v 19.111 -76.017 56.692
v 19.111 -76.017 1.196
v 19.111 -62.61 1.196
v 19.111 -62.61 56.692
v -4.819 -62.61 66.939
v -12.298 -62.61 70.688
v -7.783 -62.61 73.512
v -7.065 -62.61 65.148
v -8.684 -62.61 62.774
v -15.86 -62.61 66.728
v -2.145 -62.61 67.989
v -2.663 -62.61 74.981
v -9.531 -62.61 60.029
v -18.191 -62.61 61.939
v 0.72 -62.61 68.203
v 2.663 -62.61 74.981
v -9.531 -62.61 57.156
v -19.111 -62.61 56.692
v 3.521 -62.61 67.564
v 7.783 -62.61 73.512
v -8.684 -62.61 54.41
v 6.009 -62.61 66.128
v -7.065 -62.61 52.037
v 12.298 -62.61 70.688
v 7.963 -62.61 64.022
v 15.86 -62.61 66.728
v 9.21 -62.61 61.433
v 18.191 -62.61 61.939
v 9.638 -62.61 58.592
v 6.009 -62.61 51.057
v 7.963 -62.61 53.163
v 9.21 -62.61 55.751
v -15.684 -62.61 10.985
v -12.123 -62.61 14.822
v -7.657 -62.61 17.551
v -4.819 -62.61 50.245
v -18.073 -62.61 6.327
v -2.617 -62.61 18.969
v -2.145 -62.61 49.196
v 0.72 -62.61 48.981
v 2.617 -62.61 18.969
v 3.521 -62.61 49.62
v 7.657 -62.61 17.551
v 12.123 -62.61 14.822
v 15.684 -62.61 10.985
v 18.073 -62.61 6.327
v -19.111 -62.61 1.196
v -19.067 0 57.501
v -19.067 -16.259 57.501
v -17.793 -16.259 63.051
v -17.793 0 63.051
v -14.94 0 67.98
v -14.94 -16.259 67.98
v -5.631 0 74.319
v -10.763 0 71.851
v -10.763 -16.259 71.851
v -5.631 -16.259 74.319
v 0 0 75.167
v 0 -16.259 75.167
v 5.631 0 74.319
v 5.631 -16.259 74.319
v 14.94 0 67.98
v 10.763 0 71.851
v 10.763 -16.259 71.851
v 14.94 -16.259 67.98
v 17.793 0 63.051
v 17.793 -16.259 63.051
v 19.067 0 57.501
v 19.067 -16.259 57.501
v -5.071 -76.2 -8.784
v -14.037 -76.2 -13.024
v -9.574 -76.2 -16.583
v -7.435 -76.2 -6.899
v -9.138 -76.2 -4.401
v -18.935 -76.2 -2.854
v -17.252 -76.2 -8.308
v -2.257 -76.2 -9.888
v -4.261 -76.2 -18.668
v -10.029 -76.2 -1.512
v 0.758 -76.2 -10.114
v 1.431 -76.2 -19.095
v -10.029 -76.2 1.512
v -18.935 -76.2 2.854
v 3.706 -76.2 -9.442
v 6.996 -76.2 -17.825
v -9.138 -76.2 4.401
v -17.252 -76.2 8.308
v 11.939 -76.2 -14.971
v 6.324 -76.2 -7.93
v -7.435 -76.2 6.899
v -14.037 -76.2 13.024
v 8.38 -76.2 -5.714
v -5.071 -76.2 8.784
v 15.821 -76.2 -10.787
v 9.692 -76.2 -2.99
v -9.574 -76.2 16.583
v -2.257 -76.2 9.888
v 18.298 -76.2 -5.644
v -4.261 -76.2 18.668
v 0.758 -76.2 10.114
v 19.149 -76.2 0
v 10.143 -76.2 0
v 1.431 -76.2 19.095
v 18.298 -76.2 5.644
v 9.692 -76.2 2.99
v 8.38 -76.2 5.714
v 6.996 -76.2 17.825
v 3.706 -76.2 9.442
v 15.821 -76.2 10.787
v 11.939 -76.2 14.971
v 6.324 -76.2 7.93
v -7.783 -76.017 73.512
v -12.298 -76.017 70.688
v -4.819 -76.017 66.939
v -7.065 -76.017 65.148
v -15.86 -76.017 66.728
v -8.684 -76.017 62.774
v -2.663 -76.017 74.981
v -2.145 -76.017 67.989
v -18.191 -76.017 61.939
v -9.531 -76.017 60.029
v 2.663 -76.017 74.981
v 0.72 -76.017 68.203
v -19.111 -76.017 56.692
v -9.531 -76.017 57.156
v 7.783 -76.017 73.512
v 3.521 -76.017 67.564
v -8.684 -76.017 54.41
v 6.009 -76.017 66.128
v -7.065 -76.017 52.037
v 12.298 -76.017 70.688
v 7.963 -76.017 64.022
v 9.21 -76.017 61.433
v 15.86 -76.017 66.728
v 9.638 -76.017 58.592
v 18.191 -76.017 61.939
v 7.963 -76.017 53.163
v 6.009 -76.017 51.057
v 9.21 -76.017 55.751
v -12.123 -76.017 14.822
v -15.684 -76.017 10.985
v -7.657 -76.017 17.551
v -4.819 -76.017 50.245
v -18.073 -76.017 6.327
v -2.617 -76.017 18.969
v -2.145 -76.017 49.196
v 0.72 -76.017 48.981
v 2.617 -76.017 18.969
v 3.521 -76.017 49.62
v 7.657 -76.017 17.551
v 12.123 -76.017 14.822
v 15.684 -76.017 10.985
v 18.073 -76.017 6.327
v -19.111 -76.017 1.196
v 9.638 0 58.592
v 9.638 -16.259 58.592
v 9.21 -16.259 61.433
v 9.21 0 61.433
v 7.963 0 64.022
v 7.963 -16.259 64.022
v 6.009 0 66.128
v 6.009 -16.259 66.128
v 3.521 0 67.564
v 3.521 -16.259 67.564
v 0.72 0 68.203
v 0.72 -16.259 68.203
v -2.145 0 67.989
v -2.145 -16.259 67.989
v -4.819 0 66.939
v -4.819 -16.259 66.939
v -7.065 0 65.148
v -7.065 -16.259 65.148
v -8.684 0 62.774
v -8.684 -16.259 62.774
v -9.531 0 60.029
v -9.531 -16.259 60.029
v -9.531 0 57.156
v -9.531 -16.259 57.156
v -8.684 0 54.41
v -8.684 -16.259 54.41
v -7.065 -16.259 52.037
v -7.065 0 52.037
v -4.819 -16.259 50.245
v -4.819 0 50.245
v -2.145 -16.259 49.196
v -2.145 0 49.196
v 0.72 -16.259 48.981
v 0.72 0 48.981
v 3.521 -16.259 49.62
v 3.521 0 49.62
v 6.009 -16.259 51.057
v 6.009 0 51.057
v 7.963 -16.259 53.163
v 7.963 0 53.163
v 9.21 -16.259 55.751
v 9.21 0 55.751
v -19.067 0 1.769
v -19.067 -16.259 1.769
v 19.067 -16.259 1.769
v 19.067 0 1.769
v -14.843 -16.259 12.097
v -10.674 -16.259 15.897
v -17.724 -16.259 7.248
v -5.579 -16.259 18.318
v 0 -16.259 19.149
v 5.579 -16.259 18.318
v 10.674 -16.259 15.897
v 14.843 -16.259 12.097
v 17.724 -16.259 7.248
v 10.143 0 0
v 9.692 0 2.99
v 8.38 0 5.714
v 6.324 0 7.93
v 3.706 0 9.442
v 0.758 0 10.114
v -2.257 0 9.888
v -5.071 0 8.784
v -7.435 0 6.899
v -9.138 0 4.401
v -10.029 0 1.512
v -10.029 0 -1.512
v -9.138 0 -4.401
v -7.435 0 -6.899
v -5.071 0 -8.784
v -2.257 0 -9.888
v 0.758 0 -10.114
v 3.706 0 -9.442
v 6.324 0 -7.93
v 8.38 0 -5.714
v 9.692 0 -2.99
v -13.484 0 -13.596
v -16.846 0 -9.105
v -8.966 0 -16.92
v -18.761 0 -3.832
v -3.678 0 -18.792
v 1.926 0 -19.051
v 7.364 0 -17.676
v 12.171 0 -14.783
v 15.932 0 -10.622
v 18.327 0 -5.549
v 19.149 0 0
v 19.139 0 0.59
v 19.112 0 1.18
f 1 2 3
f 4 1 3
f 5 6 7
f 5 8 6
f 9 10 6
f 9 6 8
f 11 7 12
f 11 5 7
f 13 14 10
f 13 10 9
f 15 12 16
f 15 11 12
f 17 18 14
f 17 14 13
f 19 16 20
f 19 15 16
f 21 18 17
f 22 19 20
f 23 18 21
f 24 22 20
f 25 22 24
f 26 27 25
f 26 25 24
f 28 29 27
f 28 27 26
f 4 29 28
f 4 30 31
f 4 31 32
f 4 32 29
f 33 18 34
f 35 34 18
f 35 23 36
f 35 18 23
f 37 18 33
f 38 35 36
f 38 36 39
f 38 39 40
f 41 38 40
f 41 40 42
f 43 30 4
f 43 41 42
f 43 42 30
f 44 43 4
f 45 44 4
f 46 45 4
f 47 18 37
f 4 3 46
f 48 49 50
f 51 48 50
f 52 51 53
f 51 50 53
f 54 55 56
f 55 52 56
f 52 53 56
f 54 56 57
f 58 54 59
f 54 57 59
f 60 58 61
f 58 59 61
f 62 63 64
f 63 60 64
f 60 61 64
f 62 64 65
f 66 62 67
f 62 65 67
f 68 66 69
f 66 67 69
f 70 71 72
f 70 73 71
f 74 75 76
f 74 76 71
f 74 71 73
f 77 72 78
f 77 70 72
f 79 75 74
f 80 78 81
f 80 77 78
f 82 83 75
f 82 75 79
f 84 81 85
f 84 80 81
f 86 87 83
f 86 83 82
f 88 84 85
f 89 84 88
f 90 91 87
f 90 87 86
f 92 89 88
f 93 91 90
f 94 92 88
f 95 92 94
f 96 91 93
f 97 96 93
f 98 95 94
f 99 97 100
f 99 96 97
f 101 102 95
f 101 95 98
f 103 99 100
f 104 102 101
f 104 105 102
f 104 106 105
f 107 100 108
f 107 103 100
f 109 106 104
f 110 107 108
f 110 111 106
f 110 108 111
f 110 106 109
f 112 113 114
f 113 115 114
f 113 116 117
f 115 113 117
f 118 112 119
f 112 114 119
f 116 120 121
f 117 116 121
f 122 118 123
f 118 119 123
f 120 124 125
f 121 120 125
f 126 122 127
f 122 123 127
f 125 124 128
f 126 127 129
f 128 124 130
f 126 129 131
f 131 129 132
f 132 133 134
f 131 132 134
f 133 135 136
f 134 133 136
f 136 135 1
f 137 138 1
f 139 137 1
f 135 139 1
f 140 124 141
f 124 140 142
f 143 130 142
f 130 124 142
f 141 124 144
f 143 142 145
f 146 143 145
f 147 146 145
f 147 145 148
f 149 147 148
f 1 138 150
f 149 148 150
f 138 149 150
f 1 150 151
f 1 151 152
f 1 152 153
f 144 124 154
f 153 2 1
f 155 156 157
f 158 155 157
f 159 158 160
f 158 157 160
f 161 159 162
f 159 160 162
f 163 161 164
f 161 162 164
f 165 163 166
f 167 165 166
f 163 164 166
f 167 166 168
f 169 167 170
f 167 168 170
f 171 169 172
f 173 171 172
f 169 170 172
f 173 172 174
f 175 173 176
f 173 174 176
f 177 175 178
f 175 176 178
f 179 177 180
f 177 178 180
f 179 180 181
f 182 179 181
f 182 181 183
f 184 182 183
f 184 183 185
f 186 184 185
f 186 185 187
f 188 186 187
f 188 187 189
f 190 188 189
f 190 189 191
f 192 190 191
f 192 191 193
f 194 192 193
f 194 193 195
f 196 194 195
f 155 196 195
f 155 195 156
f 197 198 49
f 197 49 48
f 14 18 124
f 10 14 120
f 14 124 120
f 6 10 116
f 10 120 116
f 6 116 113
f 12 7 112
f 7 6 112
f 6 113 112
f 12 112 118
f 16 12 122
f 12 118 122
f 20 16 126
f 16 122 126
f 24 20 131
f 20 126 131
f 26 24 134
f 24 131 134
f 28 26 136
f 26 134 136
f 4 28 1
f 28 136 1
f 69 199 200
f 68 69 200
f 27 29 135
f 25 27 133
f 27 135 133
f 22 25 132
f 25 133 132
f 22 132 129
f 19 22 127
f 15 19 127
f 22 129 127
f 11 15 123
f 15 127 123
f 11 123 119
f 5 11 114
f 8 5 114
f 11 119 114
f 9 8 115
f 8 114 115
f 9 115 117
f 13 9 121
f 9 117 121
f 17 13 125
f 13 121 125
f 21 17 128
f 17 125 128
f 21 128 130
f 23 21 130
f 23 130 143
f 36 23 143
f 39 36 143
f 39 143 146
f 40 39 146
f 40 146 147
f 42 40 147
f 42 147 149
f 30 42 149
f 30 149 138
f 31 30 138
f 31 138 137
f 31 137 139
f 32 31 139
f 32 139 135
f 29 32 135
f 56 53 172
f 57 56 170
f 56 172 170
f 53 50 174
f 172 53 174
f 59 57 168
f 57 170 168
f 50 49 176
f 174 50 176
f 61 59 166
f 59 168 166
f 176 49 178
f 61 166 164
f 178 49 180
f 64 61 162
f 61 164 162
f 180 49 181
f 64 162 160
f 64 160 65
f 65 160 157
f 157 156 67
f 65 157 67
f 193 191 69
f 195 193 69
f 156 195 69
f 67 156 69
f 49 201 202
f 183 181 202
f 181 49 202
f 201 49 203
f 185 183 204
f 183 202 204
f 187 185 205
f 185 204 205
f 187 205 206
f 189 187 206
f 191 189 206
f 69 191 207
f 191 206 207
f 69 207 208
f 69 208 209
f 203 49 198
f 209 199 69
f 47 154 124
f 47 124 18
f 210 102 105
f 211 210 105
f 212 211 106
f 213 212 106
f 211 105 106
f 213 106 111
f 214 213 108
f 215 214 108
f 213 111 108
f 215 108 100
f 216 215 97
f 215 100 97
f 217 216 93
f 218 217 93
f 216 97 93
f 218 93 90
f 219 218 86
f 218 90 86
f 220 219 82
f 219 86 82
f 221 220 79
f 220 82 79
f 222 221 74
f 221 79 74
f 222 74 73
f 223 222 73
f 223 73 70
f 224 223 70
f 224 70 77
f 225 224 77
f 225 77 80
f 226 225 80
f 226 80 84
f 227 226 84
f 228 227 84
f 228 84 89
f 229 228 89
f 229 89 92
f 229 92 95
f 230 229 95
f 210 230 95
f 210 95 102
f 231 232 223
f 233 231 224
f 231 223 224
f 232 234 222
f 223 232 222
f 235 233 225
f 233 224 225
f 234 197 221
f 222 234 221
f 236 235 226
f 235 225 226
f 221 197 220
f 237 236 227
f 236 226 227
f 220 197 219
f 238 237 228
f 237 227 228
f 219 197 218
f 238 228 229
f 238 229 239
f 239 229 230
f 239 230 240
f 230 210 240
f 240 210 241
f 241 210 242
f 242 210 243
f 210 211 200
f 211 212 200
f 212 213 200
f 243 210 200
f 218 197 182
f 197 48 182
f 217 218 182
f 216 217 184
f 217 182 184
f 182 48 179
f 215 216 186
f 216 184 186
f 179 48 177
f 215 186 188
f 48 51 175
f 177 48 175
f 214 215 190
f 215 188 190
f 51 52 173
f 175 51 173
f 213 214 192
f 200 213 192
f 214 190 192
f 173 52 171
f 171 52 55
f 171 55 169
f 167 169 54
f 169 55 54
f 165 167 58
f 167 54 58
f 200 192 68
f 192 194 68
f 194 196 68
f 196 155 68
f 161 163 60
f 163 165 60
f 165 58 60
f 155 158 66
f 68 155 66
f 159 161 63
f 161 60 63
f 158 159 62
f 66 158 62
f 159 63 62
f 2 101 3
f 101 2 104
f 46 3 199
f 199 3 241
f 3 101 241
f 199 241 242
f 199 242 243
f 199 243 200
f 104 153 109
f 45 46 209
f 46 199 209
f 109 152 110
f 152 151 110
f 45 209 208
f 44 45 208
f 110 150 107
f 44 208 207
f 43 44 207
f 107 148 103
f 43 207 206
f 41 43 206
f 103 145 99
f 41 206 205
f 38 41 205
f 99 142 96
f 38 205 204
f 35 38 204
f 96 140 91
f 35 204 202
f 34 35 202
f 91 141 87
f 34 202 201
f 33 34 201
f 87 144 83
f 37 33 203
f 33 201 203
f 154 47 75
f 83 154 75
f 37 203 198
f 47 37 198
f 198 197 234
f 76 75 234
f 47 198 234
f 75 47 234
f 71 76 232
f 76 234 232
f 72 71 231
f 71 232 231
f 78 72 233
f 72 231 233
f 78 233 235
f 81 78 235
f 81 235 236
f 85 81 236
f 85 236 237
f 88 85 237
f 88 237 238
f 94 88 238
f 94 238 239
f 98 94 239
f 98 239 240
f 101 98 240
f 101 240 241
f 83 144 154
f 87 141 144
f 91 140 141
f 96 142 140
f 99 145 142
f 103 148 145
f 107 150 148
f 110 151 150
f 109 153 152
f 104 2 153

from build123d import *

# Parameters (mm, degrees)
F0_R      = 19.1485137608
F1_DEPTH  = 76.2
F2_R      = 10.1427054409
F3_DEPTH  = 76.2
F4_W      = 38.1332449615
F4_H      = 16.2587165833
F5_DEPTH  = 76.2
F6_W      = 38.222245872
F6_H      = 13.4063065052
F7_DEPTH  = 76.2
F9_DEPTH  = 127
F11_DEPTH = 127
F12_R     = 9.6381691068
F13_DEPTH = 127


with BuildPart() as f1:
    # F0 (on Front) → F1 (new body)
    with BuildSketch(Plane.XZ):
        Circle(F0_R)
    extrude(amount=F1_DEPTH)

    # F2 (on face) → F3 (cut)
    with BuildSketch(Plane.XZ.offset(76.2)):
        Circle(F2_R)
    extrude(amount=-F3_DEPTH, mode=Mode.SUBTRACT)

    # F4 (on Top) → F5 (join)
    with BuildSketch(Plane.XY):
        with Locations((0, -8.1293582916)):
            Rectangle(F4_W, F4_H)
    extrude(amount=F5_DEPTH)

    # F6 (on Top) → F7 (join)
    with BuildSketch(Plane.XY):
        with Locations((0, -69.3134739995)):
            Rectangle(F6_W, F6_H)
    extrude(amount=F7_DEPTH)

    # F8 (on face) → F9 (cut)
    with BuildSketch(Plane.XZ.offset(76.0166272521)):
        with BuildLine():
            ThreePointArc((10.1427054409, 0), (0, 10.1427054409), (-10.1427054409, 0))
            Line((-10.1427054409, 0), (10.1427054409, 0))
        make_face()
    extrude(amount=-F9_DEPTH, mode=Mode.SUBTRACT)

    # F10 (on face) → F11 (cut)
    with BuildSketch(Plane.XZ.offset(76.0166272521)):
        with BuildLine():
            ThreePointArc((-19.111122936, 56.6924431661), (0, 75.16739223), (19.111122936, 56.6924431661))
            Line((19.111122936, 56.6924431661), (19.111122936, 76.2))
            Line((19.111122936, 76.2), (-19.111122936, 76.2))
            Line((-19.111122936, 76.2), (-19.111122936, 56.6924431661))
        make_face()
    extrude(amount=-F11_DEPTH, mode=Mode.SUBTRACT)

    # F12 (on face) → F13 (cut)
    with BuildSketch(Plane.XZ.offset(76.0166272521)):
        with Locations((0, 58.5922114551)):
            Circle(F12_R)
    extrude(amount=-F13_DEPTH, mode=Mode.SUBTRACT)


solid = f1.part
